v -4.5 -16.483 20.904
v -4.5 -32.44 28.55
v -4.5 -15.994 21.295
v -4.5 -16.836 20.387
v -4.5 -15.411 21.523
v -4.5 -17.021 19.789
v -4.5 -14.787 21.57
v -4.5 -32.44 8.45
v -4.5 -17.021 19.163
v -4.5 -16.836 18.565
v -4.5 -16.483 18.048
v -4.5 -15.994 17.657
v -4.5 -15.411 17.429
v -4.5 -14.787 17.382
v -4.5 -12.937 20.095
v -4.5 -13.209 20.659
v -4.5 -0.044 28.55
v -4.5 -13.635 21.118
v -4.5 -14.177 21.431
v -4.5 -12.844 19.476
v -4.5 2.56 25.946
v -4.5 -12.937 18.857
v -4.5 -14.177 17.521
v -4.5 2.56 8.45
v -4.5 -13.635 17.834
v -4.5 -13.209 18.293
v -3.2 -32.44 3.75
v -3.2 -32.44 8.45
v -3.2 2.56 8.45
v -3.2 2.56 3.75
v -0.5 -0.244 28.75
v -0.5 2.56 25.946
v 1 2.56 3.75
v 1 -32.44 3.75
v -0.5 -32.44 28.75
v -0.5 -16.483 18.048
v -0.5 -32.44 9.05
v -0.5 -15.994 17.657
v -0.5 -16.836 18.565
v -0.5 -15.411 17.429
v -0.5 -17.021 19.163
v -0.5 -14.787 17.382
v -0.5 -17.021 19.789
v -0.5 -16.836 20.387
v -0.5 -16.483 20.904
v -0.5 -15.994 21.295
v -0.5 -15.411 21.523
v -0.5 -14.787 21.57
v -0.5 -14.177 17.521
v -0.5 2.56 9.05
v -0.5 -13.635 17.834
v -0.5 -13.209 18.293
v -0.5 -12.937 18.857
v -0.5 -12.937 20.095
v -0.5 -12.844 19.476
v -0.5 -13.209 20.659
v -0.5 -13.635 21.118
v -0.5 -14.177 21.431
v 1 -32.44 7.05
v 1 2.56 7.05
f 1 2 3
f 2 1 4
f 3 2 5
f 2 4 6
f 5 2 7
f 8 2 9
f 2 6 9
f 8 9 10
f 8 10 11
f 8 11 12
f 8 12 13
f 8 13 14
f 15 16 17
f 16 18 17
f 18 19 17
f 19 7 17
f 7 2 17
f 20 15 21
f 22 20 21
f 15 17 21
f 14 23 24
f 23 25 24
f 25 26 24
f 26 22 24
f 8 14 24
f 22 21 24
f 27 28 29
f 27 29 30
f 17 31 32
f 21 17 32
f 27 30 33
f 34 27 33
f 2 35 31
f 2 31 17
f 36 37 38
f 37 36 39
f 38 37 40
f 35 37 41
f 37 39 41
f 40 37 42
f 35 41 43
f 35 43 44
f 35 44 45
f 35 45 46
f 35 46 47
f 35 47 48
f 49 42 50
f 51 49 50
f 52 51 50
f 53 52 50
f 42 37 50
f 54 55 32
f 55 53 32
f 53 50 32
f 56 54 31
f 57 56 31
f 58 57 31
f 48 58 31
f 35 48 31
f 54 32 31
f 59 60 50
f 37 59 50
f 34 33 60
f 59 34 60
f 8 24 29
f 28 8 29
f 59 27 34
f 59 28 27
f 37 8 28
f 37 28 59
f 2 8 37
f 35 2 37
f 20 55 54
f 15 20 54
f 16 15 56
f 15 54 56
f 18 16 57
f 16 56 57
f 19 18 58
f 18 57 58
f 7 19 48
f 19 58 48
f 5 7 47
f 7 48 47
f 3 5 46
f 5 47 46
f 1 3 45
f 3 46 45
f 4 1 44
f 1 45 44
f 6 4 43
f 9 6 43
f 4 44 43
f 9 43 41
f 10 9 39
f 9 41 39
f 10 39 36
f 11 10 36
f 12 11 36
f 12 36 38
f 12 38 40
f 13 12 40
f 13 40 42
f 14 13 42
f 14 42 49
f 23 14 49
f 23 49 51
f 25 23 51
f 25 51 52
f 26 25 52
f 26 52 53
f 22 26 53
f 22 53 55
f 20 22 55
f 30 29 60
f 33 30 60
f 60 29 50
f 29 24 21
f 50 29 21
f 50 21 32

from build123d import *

# Parameters (mm, degrees)
PAD_DEPTH       = 35
POCKET001_DEPTH = 4.501
SKETCH010_R     = 2.1
POCKET_DEPTH    = 4.501


with BuildPart() as part:
    # Sketch001 → Pad (new body)
    with BuildSketch(Plane(origin=(0, 2.56, 3.75), x_dir=(1, 0, 0), z_dir=(0, -1, 0))):
        Polygon((-3.2, 0), (1, 0), (1, 3.3), (-0.5, 5.3), (-0.5, 25), (-4.5, 24.8), (-4.5, 4.7), (-3.2, 4.7), align=None)
    extrude(amount=PAD_DEPTH)

    # Sketch004 (on Body) → Pocket001 (cut, through all)
    with BuildSketch(Plane(origin=(0, 0.1, 0), x_dir=(0, 1, 0), z_dir=(1, 0, 0))):
        Polygon((-0.374562, 28.780826), (2.525438, 25.880826), (2.525438, 28.780826), align=None)
    extrude(amount=-POCKET001_DEPTH, mode=Mode.SUBTRACT)

    # Sketch010 → Pocket (cut, through all)
    with BuildSketch(Plane.YZ):
        with Locations((-14.943965, 19.475978)):
            Circle(SKETCH010_R)
    extrude(amount=-POCKET_DEPTH, mode=Mode.SUBTRACT)


solid = part.part
